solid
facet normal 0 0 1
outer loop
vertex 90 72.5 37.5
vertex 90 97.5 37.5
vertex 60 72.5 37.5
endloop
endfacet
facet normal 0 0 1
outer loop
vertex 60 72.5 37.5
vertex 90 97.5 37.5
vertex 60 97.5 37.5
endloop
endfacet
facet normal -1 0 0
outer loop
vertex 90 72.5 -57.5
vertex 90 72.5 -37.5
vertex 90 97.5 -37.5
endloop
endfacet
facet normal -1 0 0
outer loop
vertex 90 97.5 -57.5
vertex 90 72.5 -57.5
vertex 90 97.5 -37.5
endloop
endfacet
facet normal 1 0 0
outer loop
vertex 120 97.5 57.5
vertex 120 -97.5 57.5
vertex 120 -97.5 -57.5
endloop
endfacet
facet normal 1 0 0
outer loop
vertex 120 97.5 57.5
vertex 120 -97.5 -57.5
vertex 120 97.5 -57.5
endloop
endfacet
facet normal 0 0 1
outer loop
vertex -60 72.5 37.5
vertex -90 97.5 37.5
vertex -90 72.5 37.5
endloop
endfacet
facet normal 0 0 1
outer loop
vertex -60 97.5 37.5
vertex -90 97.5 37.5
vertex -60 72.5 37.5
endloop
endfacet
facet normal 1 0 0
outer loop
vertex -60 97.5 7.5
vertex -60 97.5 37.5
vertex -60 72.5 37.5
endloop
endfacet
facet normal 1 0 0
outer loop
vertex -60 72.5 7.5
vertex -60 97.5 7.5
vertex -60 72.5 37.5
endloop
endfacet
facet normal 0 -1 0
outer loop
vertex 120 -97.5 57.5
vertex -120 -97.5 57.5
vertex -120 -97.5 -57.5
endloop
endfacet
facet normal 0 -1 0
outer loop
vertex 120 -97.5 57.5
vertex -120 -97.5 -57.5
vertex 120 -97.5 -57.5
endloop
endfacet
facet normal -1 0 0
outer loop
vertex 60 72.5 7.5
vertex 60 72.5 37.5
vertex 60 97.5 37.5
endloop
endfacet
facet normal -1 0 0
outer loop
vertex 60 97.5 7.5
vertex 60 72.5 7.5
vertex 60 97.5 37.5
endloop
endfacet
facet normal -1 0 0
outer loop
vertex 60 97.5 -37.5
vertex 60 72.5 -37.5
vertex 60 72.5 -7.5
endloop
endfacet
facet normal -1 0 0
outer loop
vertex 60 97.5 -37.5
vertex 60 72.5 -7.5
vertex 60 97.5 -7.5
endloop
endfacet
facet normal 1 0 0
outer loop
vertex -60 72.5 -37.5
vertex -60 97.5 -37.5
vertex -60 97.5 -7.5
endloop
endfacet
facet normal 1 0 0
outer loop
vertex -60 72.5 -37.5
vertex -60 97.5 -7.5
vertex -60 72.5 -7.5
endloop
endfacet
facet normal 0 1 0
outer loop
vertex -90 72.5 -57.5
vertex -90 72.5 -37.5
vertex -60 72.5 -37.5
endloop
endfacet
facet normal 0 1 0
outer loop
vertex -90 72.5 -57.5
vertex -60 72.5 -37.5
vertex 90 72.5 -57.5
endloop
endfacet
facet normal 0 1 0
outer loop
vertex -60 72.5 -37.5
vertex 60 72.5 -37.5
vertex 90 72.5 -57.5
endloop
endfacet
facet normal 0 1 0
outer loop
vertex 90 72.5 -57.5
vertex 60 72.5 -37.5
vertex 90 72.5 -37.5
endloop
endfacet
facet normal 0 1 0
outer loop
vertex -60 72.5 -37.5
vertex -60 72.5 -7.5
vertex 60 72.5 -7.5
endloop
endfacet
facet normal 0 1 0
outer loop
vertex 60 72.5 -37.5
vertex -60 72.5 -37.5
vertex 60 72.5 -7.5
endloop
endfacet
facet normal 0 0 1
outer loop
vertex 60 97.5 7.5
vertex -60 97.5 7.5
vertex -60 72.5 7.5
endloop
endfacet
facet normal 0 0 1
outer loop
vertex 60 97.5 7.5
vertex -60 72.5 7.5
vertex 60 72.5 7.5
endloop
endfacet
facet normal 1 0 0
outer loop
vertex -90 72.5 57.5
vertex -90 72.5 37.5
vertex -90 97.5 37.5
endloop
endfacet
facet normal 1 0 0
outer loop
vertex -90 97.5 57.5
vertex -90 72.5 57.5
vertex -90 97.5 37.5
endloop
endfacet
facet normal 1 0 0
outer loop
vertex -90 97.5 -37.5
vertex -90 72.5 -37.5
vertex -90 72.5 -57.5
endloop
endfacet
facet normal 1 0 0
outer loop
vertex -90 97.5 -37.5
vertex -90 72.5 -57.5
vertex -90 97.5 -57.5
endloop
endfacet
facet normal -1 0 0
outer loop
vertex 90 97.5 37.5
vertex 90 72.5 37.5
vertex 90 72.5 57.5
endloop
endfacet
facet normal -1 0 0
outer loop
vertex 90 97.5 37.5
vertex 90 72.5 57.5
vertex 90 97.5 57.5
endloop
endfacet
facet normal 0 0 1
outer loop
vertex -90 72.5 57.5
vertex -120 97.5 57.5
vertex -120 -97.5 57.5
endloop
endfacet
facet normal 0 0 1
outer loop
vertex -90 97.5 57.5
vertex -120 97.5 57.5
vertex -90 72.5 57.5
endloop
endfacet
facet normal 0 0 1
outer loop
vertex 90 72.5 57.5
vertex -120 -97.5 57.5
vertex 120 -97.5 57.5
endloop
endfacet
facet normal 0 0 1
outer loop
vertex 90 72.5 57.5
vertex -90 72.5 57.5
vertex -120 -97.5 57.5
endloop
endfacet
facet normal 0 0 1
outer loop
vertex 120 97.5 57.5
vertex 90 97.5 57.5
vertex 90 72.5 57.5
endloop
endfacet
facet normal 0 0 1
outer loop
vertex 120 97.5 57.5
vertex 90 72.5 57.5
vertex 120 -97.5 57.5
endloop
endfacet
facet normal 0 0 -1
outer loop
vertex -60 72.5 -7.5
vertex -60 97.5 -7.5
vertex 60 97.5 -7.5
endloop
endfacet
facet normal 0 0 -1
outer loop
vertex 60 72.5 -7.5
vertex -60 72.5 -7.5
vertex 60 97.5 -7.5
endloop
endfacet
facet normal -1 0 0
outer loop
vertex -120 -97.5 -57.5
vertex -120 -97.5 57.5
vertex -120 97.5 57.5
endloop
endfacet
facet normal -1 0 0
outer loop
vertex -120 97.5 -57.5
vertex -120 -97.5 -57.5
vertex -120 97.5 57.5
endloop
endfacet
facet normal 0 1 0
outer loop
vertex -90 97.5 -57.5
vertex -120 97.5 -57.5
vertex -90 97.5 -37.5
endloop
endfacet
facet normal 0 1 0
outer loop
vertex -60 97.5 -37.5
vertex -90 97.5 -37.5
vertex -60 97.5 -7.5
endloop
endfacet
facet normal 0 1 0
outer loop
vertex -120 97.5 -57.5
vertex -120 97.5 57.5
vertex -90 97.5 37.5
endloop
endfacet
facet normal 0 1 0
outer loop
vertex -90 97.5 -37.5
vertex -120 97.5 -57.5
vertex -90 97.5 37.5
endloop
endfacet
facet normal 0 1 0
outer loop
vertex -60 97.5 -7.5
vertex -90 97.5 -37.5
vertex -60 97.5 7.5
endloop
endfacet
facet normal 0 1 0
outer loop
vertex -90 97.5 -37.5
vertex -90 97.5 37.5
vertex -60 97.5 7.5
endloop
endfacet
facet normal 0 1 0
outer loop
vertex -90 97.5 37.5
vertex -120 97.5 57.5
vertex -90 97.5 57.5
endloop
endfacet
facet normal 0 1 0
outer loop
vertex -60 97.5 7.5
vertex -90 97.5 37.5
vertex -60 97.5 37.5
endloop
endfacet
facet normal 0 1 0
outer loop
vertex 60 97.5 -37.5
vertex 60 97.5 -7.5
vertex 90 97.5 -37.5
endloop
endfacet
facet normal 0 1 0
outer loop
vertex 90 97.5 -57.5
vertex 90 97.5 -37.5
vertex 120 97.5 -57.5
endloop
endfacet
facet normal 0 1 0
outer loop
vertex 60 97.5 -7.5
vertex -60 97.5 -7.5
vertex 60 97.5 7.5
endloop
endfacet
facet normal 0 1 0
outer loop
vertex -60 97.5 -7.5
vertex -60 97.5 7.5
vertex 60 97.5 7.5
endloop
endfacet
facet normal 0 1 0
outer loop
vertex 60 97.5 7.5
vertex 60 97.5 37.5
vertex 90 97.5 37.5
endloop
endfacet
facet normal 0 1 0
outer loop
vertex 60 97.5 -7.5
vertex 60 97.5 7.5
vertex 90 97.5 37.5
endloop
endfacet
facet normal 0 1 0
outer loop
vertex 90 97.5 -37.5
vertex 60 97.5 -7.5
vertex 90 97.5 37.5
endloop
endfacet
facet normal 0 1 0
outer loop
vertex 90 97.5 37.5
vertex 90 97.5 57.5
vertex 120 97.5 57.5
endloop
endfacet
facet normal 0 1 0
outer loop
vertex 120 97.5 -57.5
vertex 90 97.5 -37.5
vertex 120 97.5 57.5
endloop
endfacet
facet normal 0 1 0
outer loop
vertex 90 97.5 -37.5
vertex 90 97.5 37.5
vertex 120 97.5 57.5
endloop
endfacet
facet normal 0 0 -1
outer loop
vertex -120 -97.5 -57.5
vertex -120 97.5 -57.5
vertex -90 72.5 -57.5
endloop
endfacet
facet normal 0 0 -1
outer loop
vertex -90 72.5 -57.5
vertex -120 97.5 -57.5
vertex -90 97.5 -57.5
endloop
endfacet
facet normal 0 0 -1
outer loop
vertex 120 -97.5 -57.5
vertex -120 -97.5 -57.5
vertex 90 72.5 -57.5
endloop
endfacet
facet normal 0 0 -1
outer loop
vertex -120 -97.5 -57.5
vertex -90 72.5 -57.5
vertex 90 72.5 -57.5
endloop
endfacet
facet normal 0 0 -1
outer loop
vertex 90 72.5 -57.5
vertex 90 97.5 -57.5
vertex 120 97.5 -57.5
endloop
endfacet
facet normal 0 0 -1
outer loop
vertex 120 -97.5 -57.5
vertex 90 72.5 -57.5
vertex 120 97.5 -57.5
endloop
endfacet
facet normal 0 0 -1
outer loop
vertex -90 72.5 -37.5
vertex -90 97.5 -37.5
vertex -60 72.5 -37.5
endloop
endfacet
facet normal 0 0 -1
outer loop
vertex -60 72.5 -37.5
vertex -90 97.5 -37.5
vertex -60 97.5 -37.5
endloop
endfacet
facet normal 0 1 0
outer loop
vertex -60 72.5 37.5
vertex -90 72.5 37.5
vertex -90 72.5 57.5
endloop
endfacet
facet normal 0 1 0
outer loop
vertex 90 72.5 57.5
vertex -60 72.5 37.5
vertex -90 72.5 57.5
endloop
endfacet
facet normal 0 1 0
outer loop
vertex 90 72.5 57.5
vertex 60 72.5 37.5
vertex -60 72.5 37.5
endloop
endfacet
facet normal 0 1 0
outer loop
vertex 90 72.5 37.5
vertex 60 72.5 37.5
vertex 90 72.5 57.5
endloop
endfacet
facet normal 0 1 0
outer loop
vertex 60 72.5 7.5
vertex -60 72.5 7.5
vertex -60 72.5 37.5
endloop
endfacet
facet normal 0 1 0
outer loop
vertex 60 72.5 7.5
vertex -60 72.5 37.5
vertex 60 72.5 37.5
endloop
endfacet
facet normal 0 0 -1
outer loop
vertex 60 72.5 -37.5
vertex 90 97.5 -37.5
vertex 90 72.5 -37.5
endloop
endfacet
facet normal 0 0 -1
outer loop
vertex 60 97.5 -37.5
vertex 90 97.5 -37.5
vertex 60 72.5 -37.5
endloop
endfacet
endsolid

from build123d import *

# Parameters (mm, degrees)
SKETCH_1_W               = 240
SKETCH_1_H               = 195
EXTRUDE_1_DEPTH          = 57.5
CUT_EXTRUDE_1_DEPTH      = 165.962116863
CUT_EXTRUDE_1_DEPTH_BACK = 50
CUT_EXTRUDE_START        = -20
CUT_EXTRUDE_2_OUTLINE_W  = 30
CUT_EXTRUDE_2_OUTLINE_H  = 25
CUT_EXTRUDE_2_DEPTH      = 20


# Read off the part's stored shape, not the designer's step: 切除-拉伸2
with BuildPart() as part:
    # 草图1 → 凸台-拉伸1 (new body)
    with BuildSketch(Plane.XY):
        Rectangle(SKETCH_1_W, SKETCH_1_H)
    extrude(amount=EXTRUDE_1_DEPTH)

    # 草图2 → 切除-拉伸1 (cut, two sides: drawn at the far end of the back side and taken through both)
    with BuildSketch(Plane.XY.offset(57.5).offset(-CUT_EXTRUDE_1_DEPTH_BACK)):
        Polygon((-60, 638.254180389), (-60, 97.5), (-60, 72.5), (60, 72.5), (60, 97.5), (60, 638.254180389), (60, 1719.762541166), (-60, 1719.762541166), align=None)
    extrude(amount=CUT_EXTRUDE_1_DEPTH + CUT_EXTRUDE_1_DEPTH_BACK, mode=Mode.SUBTRACT)

    # 切除-拉伸2 outline → 切除-拉伸2 (cut)
    with BuildSketch(Plane.XY.offset(57.5).offset(CUT_EXTRUDE_START)):
        with Locations((-75, 85)):
            Rectangle(CUT_EXTRUDE_2_OUTLINE_W, CUT_EXTRUDE_2_OUTLINE_H)
    cut_extrude_2 = extrude(amount=CUT_EXTRUDE_2_DEPTH, mode=Mode.SUBTRACT)

    # 镜向1: 切除-拉伸2 across plane
    add(cut_extrude_2.mirror(Plane(origin=(0, 0, 0), x_dir=(0, 0, 1), z_dir=(1, 0, 0))), mode=Mode.SUBTRACT)

    # 镜向2: part across plane


with BuildPart() as part_1:
    add(part.part)
    add(part.part.mirror(Plane(origin=(0, 0, 0), x_dir=(1, 0, 0), z_dir=(0, 0, -1))))


solid = part_1.part
